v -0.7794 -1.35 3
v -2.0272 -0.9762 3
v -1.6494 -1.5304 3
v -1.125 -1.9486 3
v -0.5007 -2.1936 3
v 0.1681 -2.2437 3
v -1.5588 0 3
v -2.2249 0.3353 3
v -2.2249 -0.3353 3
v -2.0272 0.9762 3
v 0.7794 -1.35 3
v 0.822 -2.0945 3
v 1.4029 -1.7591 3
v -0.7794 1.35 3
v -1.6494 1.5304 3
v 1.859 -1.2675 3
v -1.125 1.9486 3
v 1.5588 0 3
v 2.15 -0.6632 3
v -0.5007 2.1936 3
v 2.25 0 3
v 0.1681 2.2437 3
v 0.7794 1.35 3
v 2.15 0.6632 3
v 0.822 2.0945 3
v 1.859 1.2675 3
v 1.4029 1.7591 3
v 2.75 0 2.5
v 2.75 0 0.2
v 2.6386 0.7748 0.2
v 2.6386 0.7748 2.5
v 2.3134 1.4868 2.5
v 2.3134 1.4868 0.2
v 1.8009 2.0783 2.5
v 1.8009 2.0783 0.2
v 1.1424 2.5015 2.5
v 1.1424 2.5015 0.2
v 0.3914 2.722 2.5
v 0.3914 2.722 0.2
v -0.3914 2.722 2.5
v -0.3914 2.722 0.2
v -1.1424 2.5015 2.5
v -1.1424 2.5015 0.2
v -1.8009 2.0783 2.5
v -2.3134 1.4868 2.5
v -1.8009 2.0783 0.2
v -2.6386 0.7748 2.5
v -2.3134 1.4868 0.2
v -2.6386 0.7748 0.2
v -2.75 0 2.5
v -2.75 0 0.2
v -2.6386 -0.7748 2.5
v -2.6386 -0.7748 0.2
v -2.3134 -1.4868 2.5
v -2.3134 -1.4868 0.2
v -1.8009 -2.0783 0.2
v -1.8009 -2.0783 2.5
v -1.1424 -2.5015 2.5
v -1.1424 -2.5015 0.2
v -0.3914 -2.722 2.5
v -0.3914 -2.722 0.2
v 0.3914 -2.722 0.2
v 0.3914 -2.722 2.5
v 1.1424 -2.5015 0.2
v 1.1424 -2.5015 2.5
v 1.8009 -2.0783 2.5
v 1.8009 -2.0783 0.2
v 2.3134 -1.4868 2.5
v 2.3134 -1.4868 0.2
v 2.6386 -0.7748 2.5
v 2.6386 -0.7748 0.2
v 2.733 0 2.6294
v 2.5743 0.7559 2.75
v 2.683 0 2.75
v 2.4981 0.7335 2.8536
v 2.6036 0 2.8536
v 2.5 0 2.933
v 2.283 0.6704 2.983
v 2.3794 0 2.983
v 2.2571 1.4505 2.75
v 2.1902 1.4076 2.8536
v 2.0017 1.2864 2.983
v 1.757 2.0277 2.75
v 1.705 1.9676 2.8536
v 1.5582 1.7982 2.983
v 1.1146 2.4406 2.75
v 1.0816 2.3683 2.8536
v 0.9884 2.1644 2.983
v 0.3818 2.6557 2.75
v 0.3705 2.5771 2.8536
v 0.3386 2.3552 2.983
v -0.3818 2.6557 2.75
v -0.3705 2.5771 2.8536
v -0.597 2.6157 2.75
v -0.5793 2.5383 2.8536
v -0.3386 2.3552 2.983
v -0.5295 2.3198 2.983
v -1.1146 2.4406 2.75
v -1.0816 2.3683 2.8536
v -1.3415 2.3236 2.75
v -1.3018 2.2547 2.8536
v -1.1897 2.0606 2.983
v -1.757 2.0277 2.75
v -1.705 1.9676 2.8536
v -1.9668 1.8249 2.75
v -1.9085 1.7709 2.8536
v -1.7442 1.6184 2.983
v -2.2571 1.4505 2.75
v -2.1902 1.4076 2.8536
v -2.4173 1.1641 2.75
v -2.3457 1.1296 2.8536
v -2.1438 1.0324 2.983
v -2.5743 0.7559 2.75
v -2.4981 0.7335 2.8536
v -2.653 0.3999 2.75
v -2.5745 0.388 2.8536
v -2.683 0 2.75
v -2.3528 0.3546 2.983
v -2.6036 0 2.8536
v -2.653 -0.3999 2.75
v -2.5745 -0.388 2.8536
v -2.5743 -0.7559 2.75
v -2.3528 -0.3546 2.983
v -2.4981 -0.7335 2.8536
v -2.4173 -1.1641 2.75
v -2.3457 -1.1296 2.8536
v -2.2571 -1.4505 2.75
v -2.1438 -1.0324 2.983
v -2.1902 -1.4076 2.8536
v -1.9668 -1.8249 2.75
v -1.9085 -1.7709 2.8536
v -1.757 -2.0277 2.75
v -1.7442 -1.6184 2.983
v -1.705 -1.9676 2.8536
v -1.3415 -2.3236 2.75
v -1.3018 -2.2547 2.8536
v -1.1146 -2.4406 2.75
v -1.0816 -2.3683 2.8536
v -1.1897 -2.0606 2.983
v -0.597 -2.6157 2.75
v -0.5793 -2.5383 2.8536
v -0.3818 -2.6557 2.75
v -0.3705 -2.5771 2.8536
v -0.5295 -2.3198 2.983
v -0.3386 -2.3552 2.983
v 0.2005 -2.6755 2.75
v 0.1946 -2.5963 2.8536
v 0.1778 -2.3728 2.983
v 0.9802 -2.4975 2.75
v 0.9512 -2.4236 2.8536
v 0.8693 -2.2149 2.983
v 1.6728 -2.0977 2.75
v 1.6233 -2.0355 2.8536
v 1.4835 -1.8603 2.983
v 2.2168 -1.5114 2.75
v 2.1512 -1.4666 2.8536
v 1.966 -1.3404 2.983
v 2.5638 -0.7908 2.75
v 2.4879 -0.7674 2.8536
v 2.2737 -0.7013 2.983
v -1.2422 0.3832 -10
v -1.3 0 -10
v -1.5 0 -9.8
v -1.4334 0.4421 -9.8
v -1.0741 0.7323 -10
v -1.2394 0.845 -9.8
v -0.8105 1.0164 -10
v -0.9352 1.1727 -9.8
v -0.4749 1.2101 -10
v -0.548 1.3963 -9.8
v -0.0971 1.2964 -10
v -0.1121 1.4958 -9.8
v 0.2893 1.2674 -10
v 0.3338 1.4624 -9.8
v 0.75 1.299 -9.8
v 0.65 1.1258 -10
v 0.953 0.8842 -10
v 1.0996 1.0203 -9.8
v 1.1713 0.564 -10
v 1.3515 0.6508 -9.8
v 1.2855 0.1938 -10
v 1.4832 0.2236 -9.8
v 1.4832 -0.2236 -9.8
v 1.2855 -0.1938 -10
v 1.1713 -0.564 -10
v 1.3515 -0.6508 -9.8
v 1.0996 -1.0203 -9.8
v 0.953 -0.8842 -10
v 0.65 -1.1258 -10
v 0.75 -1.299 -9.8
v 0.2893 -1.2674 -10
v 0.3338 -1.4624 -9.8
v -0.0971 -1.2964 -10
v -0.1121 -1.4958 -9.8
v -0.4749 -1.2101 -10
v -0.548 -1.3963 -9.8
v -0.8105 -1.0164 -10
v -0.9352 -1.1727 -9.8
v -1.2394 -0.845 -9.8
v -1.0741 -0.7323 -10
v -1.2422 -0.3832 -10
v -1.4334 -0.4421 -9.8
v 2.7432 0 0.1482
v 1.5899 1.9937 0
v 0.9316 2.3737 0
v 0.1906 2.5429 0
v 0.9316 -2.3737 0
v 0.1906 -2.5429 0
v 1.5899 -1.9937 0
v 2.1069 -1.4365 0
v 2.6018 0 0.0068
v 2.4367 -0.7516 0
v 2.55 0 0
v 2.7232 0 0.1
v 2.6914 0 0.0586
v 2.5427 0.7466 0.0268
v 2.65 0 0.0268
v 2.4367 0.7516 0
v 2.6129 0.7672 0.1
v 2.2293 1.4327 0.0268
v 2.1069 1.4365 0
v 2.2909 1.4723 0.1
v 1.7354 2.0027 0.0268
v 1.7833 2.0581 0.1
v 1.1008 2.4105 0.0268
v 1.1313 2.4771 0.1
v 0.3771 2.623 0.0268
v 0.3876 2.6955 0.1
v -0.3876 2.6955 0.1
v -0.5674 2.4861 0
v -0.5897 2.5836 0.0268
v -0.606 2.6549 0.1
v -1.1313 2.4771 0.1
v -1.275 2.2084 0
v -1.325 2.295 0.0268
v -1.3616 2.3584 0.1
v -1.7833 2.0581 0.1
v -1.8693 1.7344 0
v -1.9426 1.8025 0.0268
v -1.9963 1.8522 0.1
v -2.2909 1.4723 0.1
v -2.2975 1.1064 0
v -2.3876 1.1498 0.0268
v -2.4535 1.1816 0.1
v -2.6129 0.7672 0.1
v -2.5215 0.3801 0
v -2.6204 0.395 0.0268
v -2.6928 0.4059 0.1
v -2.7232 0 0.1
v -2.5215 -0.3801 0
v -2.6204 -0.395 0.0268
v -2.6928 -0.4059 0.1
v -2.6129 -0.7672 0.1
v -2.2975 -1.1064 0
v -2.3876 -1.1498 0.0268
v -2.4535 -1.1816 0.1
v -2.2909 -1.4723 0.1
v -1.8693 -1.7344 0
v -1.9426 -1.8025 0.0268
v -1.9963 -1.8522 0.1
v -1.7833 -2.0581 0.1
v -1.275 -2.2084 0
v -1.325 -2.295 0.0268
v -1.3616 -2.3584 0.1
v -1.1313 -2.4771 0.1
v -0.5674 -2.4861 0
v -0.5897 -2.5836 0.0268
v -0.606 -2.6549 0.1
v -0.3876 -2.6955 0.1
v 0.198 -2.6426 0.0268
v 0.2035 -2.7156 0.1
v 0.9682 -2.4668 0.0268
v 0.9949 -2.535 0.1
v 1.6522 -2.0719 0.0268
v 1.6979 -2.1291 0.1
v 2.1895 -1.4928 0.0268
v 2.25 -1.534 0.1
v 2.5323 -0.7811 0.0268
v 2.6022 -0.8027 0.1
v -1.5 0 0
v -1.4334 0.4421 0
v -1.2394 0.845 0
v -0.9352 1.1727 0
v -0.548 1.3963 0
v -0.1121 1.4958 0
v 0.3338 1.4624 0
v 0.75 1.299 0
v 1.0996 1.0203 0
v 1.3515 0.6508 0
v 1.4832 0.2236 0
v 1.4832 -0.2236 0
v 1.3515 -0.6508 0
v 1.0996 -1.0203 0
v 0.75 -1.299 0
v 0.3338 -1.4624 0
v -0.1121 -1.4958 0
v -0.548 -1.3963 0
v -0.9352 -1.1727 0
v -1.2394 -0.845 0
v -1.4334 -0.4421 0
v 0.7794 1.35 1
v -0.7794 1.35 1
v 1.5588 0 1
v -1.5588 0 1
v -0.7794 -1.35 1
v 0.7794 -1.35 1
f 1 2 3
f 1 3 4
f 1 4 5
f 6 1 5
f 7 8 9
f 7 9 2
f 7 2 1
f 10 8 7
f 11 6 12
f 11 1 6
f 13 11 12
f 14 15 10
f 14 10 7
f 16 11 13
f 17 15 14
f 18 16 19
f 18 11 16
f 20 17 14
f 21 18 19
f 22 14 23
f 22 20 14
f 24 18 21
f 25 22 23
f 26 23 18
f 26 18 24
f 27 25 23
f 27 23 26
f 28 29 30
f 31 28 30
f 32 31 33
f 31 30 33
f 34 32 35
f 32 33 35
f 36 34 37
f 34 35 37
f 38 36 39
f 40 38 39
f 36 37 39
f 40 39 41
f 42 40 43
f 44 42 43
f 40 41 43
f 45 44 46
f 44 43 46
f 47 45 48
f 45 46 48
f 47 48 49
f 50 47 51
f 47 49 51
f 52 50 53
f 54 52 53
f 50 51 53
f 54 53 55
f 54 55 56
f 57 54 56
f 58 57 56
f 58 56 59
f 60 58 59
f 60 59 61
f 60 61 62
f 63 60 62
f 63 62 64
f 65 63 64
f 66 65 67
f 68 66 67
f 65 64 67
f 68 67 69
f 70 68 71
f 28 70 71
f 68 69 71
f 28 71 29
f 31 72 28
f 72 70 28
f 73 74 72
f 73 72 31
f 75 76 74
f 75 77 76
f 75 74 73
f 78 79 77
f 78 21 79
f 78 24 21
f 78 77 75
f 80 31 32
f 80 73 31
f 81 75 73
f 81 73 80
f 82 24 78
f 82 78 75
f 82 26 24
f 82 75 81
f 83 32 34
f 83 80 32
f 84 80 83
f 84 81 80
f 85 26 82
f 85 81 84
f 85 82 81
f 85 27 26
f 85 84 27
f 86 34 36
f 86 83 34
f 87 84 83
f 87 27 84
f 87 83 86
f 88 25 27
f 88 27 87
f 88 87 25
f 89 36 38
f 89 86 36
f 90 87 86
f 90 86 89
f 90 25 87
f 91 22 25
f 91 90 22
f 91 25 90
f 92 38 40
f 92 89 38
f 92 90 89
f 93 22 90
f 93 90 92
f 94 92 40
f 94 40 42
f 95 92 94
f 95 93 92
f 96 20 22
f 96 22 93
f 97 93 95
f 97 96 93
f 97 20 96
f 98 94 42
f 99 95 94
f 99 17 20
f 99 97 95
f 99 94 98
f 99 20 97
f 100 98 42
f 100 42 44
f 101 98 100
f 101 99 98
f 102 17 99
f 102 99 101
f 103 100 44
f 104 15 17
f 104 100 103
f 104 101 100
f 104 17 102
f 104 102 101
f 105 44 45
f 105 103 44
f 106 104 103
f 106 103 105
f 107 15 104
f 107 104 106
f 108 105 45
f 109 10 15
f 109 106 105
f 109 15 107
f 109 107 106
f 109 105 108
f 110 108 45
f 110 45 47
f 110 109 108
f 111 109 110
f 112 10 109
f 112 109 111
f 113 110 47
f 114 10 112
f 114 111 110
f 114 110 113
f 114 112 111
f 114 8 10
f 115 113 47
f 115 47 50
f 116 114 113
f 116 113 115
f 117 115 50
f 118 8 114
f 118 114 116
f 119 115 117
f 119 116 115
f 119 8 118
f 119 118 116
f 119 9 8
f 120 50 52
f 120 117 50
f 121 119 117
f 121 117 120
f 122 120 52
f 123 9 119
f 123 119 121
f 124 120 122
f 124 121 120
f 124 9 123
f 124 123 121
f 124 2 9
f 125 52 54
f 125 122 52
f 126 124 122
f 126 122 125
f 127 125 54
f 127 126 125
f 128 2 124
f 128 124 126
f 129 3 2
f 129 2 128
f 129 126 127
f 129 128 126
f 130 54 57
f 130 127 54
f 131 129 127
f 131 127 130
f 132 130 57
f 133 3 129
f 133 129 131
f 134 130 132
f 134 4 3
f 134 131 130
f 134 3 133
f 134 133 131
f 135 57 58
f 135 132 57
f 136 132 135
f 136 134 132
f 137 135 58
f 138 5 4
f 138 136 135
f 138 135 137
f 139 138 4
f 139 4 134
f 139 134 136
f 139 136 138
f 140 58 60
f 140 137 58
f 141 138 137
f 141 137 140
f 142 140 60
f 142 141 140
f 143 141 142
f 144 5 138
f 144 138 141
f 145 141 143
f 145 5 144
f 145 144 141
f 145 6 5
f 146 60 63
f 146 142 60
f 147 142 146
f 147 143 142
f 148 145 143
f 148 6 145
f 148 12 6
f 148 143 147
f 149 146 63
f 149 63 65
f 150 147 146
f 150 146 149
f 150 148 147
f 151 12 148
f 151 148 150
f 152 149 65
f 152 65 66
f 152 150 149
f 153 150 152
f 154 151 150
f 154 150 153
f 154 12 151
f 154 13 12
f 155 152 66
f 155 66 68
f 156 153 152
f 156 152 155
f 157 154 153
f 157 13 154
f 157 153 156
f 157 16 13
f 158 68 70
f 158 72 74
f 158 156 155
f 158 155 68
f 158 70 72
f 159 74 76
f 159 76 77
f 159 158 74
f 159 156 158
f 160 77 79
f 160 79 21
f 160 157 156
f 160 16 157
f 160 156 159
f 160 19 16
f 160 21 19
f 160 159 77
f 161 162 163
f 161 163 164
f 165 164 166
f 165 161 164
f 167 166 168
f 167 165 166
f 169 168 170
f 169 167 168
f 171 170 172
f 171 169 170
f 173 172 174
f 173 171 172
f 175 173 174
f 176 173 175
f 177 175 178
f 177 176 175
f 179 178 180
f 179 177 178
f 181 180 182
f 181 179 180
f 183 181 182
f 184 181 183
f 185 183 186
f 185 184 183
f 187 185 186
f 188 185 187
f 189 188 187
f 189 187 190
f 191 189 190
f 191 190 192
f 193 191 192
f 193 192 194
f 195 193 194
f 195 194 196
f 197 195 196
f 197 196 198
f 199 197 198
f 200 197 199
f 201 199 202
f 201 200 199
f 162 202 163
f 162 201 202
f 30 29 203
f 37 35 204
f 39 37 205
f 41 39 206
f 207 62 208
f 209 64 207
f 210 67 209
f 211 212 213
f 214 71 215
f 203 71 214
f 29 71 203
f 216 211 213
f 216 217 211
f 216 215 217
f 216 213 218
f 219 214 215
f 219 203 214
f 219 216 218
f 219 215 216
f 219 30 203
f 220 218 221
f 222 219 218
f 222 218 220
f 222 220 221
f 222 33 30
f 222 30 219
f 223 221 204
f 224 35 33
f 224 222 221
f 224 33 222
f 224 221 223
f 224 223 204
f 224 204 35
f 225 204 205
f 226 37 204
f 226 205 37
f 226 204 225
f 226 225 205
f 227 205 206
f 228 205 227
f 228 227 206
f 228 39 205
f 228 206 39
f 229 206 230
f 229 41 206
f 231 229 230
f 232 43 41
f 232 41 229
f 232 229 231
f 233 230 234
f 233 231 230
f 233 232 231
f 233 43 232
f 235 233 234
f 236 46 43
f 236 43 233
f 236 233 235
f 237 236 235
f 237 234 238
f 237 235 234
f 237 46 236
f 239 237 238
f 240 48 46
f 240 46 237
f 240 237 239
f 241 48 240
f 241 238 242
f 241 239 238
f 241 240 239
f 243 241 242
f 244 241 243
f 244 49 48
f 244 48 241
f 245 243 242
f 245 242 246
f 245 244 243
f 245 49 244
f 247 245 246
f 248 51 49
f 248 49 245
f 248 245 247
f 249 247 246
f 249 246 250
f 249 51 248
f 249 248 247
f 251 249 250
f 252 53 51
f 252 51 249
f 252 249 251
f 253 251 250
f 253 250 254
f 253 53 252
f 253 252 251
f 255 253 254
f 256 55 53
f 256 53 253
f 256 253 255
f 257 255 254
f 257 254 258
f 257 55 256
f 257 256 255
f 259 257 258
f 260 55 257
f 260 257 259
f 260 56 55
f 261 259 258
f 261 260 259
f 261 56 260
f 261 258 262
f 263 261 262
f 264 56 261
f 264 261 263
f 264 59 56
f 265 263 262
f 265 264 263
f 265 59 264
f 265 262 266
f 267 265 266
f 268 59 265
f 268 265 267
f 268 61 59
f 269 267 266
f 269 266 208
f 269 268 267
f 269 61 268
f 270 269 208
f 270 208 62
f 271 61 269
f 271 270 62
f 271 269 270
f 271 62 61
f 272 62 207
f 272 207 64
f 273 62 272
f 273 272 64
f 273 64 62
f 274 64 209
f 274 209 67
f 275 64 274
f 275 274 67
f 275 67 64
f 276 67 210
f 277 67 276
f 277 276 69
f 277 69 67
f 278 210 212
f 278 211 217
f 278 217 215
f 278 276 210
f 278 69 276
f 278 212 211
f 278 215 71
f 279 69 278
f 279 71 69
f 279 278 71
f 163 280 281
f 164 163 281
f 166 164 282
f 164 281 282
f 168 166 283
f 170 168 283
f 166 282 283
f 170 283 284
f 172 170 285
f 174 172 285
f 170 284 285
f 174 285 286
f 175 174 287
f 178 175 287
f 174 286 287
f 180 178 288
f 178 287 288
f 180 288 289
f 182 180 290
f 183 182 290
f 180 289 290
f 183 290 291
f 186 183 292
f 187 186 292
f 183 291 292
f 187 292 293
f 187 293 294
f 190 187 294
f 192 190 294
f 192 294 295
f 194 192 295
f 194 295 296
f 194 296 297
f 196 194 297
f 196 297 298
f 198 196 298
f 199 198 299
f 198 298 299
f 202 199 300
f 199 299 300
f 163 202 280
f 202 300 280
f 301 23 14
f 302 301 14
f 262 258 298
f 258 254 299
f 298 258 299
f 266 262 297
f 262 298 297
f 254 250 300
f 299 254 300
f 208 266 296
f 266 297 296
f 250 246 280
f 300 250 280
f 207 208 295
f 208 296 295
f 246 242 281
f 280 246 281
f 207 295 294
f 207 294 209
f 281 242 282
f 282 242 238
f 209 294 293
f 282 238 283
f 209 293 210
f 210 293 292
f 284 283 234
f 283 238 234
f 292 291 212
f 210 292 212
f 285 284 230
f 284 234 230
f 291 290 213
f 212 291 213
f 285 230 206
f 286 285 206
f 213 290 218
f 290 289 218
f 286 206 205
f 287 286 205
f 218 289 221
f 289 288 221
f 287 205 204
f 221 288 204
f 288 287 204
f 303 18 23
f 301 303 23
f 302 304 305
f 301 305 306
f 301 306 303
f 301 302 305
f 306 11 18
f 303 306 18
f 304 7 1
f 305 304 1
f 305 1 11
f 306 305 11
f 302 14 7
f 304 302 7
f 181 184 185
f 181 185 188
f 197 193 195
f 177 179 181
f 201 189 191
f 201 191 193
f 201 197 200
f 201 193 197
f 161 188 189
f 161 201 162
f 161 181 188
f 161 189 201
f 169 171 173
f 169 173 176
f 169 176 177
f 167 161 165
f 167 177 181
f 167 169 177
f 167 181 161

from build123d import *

# Parameters (mm, degrees)
SKETCH_1_R          = 2.75
EXTRUDE_1_DEPTH     = 3
FILLET_1_R          = 0.5
CUT_EXTRUDE_1_DEPTH = 2
SKETCH_3_R          = 1.5
EXTRUDE_2_DEPTH     = 10
CHAMFER_1_SIZE      = 0.2
FILLET_2_R          = 0.2


with BuildPart() as part:
    # 草图1 → 凸台-拉伸1 (new body)
    with BuildSketch(Plane.XY):
        Circle(SKETCH_1_R)
    extrude(amount=EXTRUDE_1_DEPTH)

    # 圆角1
    fillet_1_edges = [part.edges().sort_by_distance(p)[0] for p in [
        (-2.75, 0, 3),
    ]]
    fillet(fillet_1_edges, radius=FILLET_1_R)

    # 草图2 → 切除-拉伸1 (cut)
    with BuildSketch(Plane.XY.offset(3)):
        Polygon((1.558845727, 0), (0.779422863, 1.35), (-0.779422863, 1.35), (-1.558845727, 0), (-0.779422863, -1.35), (0.779422863, -1.35), align=None)
    extrude(amount=-CUT_EXTRUDE_1_DEPTH, mode=Mode.SUBTRACT)

    # 草图3 → 凸台-拉伸2 (add)
    with BuildSketch(Plane(origin=(0, 0, 0), x_dir=(-1, 0, 0), z_dir=(0, 0, -1))):
        Circle(SKETCH_3_R)
    extrude(amount=EXTRUDE_2_DEPTH)

    # 倒角1
    chamfer_1_edges = [part.edges().sort_by_distance(p)[0] for p in [
        (1.5, 0, -10),
    ]]
    chamfer(chamfer_1_edges, length=CHAMFER_1_SIZE)

    # 圆角2
    fillet_2_edges = [part.edges().sort_by_distance(p)[0] for p in [
        (-2.75, 0, 0),
    ]]
    fillet(fillet_2_edges, radius=FILLET_2_R)


solid = part.part
